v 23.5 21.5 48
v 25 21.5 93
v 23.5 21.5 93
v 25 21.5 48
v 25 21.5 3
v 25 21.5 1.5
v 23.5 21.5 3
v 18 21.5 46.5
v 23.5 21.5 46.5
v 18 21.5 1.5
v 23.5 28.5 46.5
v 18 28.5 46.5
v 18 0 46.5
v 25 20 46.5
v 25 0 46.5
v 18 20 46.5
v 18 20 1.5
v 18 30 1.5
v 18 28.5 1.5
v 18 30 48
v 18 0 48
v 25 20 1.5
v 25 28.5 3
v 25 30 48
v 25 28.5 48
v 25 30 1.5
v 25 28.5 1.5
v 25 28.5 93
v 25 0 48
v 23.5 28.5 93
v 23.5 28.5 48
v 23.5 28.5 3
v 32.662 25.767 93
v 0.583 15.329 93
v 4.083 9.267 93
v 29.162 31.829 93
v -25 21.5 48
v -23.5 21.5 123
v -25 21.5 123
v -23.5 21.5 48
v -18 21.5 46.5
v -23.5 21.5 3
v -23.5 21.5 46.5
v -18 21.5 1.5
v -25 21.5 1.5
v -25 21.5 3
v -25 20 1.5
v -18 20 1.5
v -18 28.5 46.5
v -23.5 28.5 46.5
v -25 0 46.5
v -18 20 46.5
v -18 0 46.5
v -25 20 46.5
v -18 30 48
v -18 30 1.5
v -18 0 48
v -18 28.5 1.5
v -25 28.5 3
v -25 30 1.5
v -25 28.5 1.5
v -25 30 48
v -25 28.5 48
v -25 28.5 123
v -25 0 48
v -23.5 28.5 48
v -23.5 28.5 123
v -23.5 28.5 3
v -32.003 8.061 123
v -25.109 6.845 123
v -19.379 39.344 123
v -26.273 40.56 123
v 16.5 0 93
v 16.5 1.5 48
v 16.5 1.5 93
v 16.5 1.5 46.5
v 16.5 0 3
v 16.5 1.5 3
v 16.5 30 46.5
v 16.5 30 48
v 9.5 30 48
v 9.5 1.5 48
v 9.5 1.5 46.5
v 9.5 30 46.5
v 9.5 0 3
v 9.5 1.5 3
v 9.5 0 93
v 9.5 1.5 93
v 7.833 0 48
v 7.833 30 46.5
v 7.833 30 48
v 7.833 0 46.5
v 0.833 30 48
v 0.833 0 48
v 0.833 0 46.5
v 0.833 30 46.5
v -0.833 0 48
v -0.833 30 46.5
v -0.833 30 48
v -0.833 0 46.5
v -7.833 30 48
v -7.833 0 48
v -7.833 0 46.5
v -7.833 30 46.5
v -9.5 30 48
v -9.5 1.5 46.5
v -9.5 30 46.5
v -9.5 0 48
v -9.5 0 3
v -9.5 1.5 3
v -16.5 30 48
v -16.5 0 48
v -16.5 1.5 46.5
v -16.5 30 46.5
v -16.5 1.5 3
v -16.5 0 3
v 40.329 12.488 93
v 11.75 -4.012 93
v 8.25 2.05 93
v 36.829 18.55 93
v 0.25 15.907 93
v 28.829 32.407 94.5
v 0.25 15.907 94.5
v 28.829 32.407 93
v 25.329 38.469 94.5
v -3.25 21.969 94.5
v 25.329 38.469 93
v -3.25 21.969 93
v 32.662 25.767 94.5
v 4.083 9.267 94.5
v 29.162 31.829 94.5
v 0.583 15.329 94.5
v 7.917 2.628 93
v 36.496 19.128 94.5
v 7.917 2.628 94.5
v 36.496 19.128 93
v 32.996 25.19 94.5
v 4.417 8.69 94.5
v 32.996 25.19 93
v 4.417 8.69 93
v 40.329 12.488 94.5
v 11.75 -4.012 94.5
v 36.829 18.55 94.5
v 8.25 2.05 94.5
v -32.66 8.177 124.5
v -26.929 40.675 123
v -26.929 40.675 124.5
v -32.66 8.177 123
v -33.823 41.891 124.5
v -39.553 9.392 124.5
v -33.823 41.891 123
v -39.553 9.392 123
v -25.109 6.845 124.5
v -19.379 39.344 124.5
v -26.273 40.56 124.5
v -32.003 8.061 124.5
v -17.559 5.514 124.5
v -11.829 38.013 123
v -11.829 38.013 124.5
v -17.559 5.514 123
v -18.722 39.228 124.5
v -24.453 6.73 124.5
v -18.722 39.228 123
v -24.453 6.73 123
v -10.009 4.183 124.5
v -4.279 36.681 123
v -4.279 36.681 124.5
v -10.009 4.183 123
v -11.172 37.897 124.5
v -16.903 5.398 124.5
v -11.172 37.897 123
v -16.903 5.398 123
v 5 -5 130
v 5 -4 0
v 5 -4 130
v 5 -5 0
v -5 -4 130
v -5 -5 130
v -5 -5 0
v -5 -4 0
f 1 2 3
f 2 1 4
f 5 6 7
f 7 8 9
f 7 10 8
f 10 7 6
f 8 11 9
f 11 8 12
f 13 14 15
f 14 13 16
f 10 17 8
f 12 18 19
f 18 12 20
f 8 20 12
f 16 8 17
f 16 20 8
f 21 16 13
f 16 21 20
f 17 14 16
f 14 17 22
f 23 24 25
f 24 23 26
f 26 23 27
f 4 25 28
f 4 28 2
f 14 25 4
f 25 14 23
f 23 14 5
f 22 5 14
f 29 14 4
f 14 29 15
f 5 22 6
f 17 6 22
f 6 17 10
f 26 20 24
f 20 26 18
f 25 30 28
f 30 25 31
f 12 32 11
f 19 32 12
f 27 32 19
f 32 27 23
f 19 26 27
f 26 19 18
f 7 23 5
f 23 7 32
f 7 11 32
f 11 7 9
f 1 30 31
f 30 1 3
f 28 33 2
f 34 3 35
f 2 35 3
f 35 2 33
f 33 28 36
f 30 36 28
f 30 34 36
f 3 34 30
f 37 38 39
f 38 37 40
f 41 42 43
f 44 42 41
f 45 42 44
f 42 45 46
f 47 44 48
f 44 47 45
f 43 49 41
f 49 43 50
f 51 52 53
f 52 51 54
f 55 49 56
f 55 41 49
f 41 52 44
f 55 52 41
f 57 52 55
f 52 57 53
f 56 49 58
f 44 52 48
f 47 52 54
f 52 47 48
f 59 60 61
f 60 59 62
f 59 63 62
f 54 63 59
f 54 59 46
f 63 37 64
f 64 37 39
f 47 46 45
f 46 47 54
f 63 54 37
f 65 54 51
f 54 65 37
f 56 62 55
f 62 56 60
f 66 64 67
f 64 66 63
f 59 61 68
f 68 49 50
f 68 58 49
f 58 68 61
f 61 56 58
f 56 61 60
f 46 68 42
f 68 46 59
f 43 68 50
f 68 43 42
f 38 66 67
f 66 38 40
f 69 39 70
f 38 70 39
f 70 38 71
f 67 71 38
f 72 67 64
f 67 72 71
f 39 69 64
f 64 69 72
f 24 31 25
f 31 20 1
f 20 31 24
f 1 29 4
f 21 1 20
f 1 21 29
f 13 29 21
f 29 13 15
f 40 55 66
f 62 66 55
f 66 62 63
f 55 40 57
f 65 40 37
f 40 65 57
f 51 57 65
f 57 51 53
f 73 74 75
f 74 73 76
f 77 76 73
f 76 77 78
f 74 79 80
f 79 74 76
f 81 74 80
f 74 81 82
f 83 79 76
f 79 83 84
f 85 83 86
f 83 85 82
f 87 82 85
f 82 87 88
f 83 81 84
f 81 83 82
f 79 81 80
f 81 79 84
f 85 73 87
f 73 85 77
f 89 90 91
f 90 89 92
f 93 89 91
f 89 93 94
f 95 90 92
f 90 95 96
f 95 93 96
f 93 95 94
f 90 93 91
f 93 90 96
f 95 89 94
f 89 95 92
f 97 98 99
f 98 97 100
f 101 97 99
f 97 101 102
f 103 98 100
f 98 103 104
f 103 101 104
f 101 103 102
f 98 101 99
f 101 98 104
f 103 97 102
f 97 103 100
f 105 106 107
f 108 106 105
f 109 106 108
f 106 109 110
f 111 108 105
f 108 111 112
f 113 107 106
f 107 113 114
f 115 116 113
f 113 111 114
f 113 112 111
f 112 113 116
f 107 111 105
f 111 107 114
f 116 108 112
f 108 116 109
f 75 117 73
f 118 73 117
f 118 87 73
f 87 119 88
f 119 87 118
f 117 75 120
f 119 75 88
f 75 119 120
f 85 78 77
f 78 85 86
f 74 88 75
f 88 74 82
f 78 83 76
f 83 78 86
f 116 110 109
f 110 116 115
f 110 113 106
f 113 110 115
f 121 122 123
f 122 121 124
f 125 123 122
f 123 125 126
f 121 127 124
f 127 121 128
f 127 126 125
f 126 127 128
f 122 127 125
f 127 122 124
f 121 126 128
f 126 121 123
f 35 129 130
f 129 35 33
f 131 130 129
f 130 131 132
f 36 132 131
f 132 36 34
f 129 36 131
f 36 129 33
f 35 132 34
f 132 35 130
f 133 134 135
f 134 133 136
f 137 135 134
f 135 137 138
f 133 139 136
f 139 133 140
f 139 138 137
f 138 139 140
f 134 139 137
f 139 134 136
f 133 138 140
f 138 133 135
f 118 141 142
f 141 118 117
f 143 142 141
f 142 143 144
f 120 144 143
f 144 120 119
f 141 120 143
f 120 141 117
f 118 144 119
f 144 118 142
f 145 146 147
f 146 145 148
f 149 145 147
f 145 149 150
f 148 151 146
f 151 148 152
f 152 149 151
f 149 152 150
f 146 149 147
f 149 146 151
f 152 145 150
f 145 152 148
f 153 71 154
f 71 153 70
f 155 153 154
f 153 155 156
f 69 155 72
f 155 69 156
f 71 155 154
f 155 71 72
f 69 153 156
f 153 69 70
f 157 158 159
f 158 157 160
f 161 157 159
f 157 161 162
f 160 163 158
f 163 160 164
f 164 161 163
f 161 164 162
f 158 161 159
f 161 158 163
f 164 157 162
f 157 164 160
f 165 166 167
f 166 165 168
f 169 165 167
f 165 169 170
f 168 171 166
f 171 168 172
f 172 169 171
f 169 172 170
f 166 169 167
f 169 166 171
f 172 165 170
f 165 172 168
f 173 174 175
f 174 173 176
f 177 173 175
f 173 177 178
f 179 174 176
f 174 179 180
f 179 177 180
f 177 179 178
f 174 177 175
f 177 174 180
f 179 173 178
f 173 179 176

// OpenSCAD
plate_y = 7;
plate_z = 1.5;
short_plate_d = [70, plate_y, plate_z];
half_of_short_plate_d = [short_plate_d.x / 2, short_plate_d.y, short_plate_d.z];
long_plate_d = [175.1, plate_y, plate_z];
fifty_plate_d = [50, plate_y, plate_z];
max_height = 130;
base_square_width = 50;

module duplicate_on_axis(num, el_size, width, axis) {
  gap = (width - (num * el_size)) / (num - 1);
  for (dy = [0:num - 1]) {
    offset = (el_size / 2) + (dy * (el_size + gap));
    s = axis[1] == "-" ? -1 : 1;
    v = [
      axis[0] == "x" ? s * 1 * offset : 0,
      axis[0] == "y" ? s * 1 * offset : 0,
      axis[0] == "z" ? s * 1 * offset : 0,
    ];
    translate(v)
      children(0);
  }
}

module base() {
  module long_plate() {
    cube(size=long_plate_d, center=true);
  }

  module short_plate() {
    cube(size=short_plate_d, center=true);
  }

  module half_of_short_plate() {
    cube(size=half_of_short_plate_d, center=true);
  }

  module _of_short_plate() {
    cube(size=half_of_short_plate_d, center=true);
  }

  duplicate_on_axis(num=5, el_size=plate_y, width=fifty_plate_d.x, "y") {
    translate([0, 0, plate_z / 2 + plate_z]) cube(size=fifty_plate_d, center=true);
  }

  translate([fifty_plate_d.x / 2, fifty_plate_d.x / 2, plate_z / 2])
    rotate([0, 0, 90])
      duplicate_on_axis(num=2, el_size=plate_y, width=fifty_plate_d.x, "y") {
        cube(size=fifty_plate_d, center=true);
      }
}

base();

module level_one_legs() {
  first_level_high = 45;

  module plate_x_facing(h) {
    color([1, 1, 0.8])
      translate([0, plate_z / 2, h / 2 + (plate_z / 2)])
        rotate([0, 90, 90])
          cube(size=[h, plate_y, plate_z], center=true);
  }

  module plate_y_facing(h) {
    color([1, 1, 0.5])
      translate([0, plate_y / 2, h / 2 + (plate_z / 2)])
        rotate([0, 90, 0])
          cube(size=[h, plate_y, plate_z], center=true);
  }

  module front_leg(middle_h) {
    translate([base_square_width / 2 - plate_y / 2, base_square_width / 2 - plate_y / 2 - plate_z, plate_z / 2])
      plate_x_facing(first_level_high);

    translate([0, plate_y + plate_z, 0])
      translate([base_square_width / 2 - plate_y / 2, base_square_width / 2 - plate_y / 2 - plate_z, plate_z / 2])
        plate_x_facing(first_level_high);

    translate([base_square_width / 2 - plate_z / 2, base_square_width / 2 - plate_y / 2, 3 / 2 * plate_z])
      plate_y_facing(middle_h);
  }

  front_leg(90);

  mirror([1, 0, 0]) front_leg(120);
}

level_one_legs();

module final_height_helper() {
  color("blue", 0.4) translate([-5, -5, 0]) cube([10, 1, max_height]);
}

final_height_helper();

module level_one_base() {
  carrier_width = 30;

  module carrier() {
    color([0.4, 0.6, 0.7]) cube([plate_y, carrier_width, plate_z]);
  }

  module carrier_edge() {
    color([0.4, 0.6, 0.7]) difference() {
        cube([plate_y, carrier_width, plate_z]);
        translate([plate_y - plate_z, carrier_width - plate_y - plate_z, 0])
          cube([plate_z, plate_y, plate_z]);
      }
  }

  translate([(base_square_width / 2) - plate_y, 0, 0]) carrier_edge();
  mirror([1, 0, 0]) translate([(base_square_width / 2) - plate_y, 0, 0]) carrier_edge();

  gap = 3;
  translate([(base_square_width / 2) - 3 * plate_y / 2, 0, 0])
    duplicate_on_axis(num=4, el_size=plate_y, width=36 - gap, axis="x-") {
      translate([-(gap / 2), 0, 0]) carrier();
    }
}

translate([0, 0, 46.5]) level_one_base();

module level_two_legs() {
  module leg() {
    translate([(base_square_width / 2) - 8.5 - plate_y, 0, plate_z * 2]) cube([plate_y, plate_z, 90]);
  }

  module shorter_leg() {
    translate([(base_square_width / 2) - 8.5 - plate_y, 0, plate_z * 2]) cube([plate_y, plate_z, 45]);
  }

  leg();
  mirror([1, 0, 0]) shorter_leg();
}

color("purple") level_two_legs();

module level_two_base() {
  module grid() {
    duplicate_on_axis(num=4, el_size=plate_y, width=30, axis="x") {
      cube(size=[plate_y, 33, plate_z]);
    }
  }

  color("green") grid();
}

translate([-5, 25, 90 + plate_z * 2]) rotate([0, 0, -60]) level_two_base();

module level_there_base() {
  module grid() {
    duplicate_on_axis(num=4, el_size=plate_y, width=30, axis="x") {
      cube(size=[plate_y, 33, plate_z]);
    }
  }

  color("silver") grid();
}

translate([-base_square_width + plate_y, 10, 120 + plate_z * 2]) rotate([0, 0, -10]) level_there_base();
